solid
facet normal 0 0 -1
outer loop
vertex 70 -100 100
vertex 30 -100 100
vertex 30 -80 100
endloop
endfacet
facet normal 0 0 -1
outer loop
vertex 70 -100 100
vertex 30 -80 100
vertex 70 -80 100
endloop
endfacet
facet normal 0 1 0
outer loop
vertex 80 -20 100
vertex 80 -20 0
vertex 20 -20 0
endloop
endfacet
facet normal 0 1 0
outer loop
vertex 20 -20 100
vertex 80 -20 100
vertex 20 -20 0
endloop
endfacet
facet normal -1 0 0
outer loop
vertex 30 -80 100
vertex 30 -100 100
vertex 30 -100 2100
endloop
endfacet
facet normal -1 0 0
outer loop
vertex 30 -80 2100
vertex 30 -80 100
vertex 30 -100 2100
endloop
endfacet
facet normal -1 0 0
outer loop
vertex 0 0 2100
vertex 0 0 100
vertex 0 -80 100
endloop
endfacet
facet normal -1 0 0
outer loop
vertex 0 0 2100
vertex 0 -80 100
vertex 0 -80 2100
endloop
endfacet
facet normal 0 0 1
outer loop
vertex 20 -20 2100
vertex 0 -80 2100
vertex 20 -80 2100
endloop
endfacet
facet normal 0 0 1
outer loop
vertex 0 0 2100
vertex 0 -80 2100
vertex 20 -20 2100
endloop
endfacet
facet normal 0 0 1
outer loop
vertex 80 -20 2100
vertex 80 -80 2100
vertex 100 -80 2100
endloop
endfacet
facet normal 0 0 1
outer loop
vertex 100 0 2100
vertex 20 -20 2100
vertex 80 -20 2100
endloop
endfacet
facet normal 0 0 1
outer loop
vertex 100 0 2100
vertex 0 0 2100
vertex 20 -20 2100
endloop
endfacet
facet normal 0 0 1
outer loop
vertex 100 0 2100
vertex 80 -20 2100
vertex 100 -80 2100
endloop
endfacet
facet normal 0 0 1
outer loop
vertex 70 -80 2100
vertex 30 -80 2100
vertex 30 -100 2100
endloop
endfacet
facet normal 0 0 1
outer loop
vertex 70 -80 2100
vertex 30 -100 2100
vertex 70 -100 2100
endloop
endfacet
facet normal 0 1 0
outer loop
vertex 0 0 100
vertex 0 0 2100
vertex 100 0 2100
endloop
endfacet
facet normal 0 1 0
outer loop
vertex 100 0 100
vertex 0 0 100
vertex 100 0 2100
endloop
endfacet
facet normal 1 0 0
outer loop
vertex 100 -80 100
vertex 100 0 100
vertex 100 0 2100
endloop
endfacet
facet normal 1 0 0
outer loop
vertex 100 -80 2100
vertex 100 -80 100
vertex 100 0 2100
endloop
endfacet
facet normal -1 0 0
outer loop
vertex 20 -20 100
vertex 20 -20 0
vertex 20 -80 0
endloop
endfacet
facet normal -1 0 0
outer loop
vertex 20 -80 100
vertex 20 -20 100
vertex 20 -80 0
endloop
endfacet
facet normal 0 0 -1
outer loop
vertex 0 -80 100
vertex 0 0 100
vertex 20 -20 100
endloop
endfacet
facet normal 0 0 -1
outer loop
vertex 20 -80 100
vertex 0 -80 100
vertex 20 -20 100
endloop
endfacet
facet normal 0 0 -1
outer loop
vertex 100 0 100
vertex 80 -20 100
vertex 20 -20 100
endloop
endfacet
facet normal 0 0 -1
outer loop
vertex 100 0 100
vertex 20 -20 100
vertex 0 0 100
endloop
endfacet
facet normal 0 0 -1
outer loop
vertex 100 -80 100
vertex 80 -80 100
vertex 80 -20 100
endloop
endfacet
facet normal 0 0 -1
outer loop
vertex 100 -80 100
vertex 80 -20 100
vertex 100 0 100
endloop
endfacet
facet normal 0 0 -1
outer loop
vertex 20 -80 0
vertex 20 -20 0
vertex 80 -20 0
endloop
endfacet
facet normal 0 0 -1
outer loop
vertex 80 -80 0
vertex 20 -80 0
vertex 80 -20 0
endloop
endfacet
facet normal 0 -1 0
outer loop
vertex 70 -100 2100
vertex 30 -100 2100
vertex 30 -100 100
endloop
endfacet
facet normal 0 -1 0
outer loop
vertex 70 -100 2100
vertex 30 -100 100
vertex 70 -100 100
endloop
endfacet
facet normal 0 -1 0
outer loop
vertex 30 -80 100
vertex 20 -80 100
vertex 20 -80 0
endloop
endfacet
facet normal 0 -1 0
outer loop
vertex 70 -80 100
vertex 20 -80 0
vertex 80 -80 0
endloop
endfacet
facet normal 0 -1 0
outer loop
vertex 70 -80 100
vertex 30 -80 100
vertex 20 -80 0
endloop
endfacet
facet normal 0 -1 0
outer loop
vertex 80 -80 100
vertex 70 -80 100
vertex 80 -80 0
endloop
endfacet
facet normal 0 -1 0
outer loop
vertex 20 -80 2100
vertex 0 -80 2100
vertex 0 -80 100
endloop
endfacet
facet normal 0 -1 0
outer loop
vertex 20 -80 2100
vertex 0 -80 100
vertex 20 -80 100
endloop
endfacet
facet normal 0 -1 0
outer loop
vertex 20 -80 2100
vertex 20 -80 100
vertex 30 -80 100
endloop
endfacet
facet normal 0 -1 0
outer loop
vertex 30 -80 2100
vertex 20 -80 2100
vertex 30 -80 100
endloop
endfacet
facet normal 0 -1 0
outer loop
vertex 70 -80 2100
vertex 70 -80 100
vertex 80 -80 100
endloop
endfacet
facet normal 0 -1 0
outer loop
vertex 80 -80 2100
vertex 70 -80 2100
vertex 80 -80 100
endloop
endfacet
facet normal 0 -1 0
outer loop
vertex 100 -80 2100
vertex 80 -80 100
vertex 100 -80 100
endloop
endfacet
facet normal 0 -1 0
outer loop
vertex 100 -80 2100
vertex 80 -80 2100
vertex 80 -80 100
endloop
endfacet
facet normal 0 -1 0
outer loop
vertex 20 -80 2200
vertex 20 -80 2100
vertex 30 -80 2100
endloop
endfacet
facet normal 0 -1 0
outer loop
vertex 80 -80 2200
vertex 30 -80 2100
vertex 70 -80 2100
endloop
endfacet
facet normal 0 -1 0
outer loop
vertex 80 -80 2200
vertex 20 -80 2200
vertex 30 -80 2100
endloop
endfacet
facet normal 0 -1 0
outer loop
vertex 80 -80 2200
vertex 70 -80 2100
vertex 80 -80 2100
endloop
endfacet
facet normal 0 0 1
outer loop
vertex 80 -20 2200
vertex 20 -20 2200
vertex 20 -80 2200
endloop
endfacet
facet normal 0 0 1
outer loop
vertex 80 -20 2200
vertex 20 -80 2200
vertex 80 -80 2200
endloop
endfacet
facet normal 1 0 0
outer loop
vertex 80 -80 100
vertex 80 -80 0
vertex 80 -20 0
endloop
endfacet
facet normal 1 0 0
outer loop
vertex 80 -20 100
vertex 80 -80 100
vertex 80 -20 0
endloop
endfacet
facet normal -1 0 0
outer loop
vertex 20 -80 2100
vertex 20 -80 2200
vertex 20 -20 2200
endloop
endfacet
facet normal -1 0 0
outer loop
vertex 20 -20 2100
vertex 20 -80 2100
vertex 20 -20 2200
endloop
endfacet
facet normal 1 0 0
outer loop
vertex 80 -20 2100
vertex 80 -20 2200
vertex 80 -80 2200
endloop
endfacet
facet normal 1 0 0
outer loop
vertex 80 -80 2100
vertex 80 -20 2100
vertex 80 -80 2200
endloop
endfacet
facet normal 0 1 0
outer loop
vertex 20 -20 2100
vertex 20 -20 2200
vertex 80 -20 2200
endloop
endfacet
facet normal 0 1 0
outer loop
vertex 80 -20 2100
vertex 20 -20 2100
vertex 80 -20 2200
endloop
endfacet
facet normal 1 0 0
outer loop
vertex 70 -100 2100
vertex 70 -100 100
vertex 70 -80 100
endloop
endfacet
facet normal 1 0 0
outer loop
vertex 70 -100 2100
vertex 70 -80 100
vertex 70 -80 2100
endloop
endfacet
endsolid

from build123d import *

# Parameters (mm, degrees)
F0_W     = 100
F0_H     = 2200
F1_DEPTH = 100
F2_W     = 30
F2_H     = 2200
F3_DEPTH = 20
F4_W     = 40
F4_H     = 20
F5_DEPTH = 100
F6_W     = 40
F6_H     = 20
F7_DEPTH = 100


with BuildPart() as f1:
    # F0 (on Front) → F1 (new body)
    with BuildSketch(Plane.XZ):
        with Locations((50, 1100)):
            Rectangle(F0_W, F0_H)
    extrude(amount=F1_DEPTH)

    # F2 (on face) → F3 (cut)
    with BuildSketch(Plane.XZ.offset(100)):
        with Locations((15, 1100)):
            Rectangle(F2_W, F2_H)
        with Locations((85, 1100)):
            Rectangle(F2_W, F2_H)
    extrude(amount=-F3_DEPTH, mode=Mode.SUBTRACT)

    # F4 (on face) → F5 (cut)
    with BuildSketch(Plane.XY.offset(2200)):
        Polygon((20, -80), (20, -20), (80, -20), (80, -80), (100, -80), (100, 0), (0, 0), (0, -80), align=None)
        with Locations((50, -90)):
            Rectangle(F4_W, F4_H)
    extrude(amount=-F5_DEPTH, mode=Mode.SUBTRACT)

    # F6 (on face) → F7 (cut)
    with BuildSketch(Plane(origin=(0, 0, 0), x_dir=(1, 0, 0), z_dir=(0, 0, -1))):
        Polygon((80, 80), (80, 20), (20, 20), (20, 80), (0, 80), (0, 0), (100, 0), (100, 80), align=None)
        with Locations((50, 90)):
            Rectangle(F6_W, F6_H)
    extrude(amount=-F7_DEPTH, mode=Mode.SUBTRACT)


solid = f1.part
